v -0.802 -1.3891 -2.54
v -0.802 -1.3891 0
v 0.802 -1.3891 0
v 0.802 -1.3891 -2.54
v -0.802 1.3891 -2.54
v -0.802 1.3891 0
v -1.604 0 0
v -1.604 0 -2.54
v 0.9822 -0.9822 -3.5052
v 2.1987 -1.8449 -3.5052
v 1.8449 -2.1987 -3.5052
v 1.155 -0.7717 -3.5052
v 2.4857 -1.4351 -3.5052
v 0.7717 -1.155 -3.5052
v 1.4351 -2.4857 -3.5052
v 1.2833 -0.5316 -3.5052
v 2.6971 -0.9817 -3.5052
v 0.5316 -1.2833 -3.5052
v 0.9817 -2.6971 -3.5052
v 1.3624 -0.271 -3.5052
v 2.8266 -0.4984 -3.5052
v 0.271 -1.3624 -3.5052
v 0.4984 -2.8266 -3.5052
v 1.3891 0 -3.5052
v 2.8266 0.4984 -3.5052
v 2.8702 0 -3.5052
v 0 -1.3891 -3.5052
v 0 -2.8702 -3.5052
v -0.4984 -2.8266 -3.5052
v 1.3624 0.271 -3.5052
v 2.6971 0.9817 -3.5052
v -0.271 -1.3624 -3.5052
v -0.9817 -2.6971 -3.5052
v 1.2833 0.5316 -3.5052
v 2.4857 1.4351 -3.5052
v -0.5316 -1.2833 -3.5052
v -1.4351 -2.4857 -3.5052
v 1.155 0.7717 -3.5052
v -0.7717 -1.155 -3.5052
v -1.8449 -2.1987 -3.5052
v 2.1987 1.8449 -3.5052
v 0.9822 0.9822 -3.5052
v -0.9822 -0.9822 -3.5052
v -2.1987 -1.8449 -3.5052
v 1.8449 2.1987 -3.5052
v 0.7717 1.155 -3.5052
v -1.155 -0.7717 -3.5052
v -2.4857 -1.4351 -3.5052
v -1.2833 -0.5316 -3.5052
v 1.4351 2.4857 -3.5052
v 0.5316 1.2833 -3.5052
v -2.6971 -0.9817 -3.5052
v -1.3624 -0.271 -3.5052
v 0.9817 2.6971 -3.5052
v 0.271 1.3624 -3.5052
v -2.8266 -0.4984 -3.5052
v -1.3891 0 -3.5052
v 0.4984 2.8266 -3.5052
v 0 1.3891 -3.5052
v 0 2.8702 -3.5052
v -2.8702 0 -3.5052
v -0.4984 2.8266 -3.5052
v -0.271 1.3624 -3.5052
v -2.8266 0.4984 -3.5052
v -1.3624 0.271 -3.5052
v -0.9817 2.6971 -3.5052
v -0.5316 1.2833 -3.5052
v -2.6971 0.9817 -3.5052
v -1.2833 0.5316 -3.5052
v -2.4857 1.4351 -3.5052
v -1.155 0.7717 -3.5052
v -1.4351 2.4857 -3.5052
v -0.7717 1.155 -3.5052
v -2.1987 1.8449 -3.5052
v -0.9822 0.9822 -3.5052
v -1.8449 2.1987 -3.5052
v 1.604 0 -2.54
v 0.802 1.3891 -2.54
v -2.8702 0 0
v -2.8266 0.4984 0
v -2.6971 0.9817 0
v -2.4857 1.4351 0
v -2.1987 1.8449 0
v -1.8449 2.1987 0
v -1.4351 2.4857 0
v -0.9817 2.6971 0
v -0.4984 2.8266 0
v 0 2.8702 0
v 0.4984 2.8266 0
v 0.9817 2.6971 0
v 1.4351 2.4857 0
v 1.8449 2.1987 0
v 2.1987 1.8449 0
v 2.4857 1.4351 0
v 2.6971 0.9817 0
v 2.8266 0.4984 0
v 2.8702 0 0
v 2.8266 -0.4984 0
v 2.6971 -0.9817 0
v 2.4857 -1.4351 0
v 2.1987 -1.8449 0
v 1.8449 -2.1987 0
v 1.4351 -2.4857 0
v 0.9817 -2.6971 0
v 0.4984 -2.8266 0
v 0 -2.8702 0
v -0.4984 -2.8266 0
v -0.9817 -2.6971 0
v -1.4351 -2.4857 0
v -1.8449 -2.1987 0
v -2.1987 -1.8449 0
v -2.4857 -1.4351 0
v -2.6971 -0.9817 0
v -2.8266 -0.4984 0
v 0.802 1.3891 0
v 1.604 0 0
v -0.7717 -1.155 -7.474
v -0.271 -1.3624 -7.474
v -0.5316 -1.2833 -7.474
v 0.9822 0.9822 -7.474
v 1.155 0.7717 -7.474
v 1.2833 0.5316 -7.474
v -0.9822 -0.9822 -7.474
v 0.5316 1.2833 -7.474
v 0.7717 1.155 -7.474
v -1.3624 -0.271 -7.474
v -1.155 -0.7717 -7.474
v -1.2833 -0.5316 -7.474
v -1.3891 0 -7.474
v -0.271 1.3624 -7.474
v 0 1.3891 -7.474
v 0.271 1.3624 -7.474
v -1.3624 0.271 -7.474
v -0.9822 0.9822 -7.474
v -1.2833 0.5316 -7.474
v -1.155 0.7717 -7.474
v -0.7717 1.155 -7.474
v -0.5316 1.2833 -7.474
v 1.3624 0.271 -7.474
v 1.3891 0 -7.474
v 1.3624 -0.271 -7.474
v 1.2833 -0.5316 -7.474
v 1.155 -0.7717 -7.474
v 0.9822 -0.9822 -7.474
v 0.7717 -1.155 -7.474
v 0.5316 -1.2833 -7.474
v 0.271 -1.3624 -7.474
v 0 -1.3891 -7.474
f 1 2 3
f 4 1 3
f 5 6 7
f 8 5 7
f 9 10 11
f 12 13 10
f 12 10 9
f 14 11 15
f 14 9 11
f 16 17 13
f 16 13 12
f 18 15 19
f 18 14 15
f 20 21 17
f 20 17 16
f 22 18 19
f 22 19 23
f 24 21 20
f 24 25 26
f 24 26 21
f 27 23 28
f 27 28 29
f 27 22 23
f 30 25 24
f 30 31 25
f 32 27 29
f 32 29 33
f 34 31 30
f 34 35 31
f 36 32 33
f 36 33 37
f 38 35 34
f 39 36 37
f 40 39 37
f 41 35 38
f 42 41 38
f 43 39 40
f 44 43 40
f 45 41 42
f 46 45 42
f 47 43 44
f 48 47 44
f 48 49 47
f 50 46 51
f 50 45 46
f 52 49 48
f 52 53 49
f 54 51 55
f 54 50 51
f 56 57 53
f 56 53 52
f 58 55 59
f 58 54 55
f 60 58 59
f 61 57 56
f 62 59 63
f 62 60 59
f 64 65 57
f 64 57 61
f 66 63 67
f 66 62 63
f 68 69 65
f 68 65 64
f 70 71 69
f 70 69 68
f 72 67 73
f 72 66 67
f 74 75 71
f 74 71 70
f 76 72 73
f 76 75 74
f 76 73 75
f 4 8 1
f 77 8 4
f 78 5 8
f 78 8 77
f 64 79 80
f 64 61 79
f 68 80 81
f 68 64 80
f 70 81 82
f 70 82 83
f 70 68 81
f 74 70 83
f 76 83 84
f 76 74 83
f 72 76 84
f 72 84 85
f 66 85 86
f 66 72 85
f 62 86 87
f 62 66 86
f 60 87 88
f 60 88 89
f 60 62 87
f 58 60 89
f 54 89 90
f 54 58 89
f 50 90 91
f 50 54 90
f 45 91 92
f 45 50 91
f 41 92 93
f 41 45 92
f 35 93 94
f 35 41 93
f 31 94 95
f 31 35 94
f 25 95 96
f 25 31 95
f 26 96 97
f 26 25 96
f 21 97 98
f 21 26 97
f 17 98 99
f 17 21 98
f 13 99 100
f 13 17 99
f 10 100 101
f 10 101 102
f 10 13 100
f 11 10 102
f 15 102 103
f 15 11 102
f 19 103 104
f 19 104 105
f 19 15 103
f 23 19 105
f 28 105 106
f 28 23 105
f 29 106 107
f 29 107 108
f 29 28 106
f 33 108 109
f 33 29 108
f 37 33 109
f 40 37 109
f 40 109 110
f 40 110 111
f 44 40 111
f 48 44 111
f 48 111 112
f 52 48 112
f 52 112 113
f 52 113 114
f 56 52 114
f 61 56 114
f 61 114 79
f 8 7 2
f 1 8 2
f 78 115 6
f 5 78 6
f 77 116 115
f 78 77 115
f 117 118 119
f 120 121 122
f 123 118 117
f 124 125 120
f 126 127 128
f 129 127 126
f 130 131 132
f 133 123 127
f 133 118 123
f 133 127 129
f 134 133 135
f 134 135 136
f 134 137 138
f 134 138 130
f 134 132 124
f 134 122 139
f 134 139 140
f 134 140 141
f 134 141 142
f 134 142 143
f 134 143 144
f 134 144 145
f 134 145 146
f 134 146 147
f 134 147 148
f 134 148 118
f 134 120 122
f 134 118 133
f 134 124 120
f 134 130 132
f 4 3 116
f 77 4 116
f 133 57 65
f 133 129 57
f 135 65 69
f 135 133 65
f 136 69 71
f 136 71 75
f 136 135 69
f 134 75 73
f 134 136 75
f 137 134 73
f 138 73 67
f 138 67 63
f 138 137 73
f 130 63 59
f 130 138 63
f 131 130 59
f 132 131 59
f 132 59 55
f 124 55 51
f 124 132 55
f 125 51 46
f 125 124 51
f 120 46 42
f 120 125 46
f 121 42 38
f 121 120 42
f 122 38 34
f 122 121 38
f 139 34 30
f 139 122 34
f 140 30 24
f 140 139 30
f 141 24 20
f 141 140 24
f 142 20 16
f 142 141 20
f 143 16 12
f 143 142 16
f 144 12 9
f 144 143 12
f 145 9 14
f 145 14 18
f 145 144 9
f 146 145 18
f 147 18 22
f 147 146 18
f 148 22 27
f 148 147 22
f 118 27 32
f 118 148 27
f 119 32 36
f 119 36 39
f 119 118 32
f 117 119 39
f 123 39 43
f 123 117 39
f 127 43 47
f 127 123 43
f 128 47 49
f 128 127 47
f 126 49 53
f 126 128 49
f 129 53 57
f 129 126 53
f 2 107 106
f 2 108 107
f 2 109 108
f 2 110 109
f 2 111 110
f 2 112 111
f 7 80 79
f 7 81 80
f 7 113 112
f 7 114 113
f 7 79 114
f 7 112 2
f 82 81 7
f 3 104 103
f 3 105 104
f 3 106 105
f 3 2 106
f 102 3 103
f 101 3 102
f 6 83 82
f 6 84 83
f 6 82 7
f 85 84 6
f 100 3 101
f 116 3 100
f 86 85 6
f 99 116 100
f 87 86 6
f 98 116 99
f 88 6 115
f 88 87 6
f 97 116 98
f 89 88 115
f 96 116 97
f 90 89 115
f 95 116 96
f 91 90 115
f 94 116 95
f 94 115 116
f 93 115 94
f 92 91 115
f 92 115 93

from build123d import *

# Parameters (mm, degrees)
F3_DEPTH = 2.54


with BuildPart() as f1:
    # F0 (on Front) → F1 (revolve)
    with BuildSketch(Plane.XZ):
        Polygon((0, -7.47395), (0, 0), (-2.8702, 0), (-2.8702, -3.5052), (-1.389063, -3.5052), (-1.389063, -7.47395), align=None)
    revolve(axis=Axis((0, 0, -3.736975), (0, 0, -1)))

    # F2 (on face) → F3 (cut)
    with BuildSketch(Plane.XY):
        Polygon((0.801976, 1.389063), (-0.801976, 1.389063), (-1.603951, 0), (-0.801976, -1.389063), (0.801976, -1.389062), (1.603951, 0), align=None)
    extrude(amount=-F3_DEPTH, mode=Mode.SUBTRACT)


solid = f1.part
